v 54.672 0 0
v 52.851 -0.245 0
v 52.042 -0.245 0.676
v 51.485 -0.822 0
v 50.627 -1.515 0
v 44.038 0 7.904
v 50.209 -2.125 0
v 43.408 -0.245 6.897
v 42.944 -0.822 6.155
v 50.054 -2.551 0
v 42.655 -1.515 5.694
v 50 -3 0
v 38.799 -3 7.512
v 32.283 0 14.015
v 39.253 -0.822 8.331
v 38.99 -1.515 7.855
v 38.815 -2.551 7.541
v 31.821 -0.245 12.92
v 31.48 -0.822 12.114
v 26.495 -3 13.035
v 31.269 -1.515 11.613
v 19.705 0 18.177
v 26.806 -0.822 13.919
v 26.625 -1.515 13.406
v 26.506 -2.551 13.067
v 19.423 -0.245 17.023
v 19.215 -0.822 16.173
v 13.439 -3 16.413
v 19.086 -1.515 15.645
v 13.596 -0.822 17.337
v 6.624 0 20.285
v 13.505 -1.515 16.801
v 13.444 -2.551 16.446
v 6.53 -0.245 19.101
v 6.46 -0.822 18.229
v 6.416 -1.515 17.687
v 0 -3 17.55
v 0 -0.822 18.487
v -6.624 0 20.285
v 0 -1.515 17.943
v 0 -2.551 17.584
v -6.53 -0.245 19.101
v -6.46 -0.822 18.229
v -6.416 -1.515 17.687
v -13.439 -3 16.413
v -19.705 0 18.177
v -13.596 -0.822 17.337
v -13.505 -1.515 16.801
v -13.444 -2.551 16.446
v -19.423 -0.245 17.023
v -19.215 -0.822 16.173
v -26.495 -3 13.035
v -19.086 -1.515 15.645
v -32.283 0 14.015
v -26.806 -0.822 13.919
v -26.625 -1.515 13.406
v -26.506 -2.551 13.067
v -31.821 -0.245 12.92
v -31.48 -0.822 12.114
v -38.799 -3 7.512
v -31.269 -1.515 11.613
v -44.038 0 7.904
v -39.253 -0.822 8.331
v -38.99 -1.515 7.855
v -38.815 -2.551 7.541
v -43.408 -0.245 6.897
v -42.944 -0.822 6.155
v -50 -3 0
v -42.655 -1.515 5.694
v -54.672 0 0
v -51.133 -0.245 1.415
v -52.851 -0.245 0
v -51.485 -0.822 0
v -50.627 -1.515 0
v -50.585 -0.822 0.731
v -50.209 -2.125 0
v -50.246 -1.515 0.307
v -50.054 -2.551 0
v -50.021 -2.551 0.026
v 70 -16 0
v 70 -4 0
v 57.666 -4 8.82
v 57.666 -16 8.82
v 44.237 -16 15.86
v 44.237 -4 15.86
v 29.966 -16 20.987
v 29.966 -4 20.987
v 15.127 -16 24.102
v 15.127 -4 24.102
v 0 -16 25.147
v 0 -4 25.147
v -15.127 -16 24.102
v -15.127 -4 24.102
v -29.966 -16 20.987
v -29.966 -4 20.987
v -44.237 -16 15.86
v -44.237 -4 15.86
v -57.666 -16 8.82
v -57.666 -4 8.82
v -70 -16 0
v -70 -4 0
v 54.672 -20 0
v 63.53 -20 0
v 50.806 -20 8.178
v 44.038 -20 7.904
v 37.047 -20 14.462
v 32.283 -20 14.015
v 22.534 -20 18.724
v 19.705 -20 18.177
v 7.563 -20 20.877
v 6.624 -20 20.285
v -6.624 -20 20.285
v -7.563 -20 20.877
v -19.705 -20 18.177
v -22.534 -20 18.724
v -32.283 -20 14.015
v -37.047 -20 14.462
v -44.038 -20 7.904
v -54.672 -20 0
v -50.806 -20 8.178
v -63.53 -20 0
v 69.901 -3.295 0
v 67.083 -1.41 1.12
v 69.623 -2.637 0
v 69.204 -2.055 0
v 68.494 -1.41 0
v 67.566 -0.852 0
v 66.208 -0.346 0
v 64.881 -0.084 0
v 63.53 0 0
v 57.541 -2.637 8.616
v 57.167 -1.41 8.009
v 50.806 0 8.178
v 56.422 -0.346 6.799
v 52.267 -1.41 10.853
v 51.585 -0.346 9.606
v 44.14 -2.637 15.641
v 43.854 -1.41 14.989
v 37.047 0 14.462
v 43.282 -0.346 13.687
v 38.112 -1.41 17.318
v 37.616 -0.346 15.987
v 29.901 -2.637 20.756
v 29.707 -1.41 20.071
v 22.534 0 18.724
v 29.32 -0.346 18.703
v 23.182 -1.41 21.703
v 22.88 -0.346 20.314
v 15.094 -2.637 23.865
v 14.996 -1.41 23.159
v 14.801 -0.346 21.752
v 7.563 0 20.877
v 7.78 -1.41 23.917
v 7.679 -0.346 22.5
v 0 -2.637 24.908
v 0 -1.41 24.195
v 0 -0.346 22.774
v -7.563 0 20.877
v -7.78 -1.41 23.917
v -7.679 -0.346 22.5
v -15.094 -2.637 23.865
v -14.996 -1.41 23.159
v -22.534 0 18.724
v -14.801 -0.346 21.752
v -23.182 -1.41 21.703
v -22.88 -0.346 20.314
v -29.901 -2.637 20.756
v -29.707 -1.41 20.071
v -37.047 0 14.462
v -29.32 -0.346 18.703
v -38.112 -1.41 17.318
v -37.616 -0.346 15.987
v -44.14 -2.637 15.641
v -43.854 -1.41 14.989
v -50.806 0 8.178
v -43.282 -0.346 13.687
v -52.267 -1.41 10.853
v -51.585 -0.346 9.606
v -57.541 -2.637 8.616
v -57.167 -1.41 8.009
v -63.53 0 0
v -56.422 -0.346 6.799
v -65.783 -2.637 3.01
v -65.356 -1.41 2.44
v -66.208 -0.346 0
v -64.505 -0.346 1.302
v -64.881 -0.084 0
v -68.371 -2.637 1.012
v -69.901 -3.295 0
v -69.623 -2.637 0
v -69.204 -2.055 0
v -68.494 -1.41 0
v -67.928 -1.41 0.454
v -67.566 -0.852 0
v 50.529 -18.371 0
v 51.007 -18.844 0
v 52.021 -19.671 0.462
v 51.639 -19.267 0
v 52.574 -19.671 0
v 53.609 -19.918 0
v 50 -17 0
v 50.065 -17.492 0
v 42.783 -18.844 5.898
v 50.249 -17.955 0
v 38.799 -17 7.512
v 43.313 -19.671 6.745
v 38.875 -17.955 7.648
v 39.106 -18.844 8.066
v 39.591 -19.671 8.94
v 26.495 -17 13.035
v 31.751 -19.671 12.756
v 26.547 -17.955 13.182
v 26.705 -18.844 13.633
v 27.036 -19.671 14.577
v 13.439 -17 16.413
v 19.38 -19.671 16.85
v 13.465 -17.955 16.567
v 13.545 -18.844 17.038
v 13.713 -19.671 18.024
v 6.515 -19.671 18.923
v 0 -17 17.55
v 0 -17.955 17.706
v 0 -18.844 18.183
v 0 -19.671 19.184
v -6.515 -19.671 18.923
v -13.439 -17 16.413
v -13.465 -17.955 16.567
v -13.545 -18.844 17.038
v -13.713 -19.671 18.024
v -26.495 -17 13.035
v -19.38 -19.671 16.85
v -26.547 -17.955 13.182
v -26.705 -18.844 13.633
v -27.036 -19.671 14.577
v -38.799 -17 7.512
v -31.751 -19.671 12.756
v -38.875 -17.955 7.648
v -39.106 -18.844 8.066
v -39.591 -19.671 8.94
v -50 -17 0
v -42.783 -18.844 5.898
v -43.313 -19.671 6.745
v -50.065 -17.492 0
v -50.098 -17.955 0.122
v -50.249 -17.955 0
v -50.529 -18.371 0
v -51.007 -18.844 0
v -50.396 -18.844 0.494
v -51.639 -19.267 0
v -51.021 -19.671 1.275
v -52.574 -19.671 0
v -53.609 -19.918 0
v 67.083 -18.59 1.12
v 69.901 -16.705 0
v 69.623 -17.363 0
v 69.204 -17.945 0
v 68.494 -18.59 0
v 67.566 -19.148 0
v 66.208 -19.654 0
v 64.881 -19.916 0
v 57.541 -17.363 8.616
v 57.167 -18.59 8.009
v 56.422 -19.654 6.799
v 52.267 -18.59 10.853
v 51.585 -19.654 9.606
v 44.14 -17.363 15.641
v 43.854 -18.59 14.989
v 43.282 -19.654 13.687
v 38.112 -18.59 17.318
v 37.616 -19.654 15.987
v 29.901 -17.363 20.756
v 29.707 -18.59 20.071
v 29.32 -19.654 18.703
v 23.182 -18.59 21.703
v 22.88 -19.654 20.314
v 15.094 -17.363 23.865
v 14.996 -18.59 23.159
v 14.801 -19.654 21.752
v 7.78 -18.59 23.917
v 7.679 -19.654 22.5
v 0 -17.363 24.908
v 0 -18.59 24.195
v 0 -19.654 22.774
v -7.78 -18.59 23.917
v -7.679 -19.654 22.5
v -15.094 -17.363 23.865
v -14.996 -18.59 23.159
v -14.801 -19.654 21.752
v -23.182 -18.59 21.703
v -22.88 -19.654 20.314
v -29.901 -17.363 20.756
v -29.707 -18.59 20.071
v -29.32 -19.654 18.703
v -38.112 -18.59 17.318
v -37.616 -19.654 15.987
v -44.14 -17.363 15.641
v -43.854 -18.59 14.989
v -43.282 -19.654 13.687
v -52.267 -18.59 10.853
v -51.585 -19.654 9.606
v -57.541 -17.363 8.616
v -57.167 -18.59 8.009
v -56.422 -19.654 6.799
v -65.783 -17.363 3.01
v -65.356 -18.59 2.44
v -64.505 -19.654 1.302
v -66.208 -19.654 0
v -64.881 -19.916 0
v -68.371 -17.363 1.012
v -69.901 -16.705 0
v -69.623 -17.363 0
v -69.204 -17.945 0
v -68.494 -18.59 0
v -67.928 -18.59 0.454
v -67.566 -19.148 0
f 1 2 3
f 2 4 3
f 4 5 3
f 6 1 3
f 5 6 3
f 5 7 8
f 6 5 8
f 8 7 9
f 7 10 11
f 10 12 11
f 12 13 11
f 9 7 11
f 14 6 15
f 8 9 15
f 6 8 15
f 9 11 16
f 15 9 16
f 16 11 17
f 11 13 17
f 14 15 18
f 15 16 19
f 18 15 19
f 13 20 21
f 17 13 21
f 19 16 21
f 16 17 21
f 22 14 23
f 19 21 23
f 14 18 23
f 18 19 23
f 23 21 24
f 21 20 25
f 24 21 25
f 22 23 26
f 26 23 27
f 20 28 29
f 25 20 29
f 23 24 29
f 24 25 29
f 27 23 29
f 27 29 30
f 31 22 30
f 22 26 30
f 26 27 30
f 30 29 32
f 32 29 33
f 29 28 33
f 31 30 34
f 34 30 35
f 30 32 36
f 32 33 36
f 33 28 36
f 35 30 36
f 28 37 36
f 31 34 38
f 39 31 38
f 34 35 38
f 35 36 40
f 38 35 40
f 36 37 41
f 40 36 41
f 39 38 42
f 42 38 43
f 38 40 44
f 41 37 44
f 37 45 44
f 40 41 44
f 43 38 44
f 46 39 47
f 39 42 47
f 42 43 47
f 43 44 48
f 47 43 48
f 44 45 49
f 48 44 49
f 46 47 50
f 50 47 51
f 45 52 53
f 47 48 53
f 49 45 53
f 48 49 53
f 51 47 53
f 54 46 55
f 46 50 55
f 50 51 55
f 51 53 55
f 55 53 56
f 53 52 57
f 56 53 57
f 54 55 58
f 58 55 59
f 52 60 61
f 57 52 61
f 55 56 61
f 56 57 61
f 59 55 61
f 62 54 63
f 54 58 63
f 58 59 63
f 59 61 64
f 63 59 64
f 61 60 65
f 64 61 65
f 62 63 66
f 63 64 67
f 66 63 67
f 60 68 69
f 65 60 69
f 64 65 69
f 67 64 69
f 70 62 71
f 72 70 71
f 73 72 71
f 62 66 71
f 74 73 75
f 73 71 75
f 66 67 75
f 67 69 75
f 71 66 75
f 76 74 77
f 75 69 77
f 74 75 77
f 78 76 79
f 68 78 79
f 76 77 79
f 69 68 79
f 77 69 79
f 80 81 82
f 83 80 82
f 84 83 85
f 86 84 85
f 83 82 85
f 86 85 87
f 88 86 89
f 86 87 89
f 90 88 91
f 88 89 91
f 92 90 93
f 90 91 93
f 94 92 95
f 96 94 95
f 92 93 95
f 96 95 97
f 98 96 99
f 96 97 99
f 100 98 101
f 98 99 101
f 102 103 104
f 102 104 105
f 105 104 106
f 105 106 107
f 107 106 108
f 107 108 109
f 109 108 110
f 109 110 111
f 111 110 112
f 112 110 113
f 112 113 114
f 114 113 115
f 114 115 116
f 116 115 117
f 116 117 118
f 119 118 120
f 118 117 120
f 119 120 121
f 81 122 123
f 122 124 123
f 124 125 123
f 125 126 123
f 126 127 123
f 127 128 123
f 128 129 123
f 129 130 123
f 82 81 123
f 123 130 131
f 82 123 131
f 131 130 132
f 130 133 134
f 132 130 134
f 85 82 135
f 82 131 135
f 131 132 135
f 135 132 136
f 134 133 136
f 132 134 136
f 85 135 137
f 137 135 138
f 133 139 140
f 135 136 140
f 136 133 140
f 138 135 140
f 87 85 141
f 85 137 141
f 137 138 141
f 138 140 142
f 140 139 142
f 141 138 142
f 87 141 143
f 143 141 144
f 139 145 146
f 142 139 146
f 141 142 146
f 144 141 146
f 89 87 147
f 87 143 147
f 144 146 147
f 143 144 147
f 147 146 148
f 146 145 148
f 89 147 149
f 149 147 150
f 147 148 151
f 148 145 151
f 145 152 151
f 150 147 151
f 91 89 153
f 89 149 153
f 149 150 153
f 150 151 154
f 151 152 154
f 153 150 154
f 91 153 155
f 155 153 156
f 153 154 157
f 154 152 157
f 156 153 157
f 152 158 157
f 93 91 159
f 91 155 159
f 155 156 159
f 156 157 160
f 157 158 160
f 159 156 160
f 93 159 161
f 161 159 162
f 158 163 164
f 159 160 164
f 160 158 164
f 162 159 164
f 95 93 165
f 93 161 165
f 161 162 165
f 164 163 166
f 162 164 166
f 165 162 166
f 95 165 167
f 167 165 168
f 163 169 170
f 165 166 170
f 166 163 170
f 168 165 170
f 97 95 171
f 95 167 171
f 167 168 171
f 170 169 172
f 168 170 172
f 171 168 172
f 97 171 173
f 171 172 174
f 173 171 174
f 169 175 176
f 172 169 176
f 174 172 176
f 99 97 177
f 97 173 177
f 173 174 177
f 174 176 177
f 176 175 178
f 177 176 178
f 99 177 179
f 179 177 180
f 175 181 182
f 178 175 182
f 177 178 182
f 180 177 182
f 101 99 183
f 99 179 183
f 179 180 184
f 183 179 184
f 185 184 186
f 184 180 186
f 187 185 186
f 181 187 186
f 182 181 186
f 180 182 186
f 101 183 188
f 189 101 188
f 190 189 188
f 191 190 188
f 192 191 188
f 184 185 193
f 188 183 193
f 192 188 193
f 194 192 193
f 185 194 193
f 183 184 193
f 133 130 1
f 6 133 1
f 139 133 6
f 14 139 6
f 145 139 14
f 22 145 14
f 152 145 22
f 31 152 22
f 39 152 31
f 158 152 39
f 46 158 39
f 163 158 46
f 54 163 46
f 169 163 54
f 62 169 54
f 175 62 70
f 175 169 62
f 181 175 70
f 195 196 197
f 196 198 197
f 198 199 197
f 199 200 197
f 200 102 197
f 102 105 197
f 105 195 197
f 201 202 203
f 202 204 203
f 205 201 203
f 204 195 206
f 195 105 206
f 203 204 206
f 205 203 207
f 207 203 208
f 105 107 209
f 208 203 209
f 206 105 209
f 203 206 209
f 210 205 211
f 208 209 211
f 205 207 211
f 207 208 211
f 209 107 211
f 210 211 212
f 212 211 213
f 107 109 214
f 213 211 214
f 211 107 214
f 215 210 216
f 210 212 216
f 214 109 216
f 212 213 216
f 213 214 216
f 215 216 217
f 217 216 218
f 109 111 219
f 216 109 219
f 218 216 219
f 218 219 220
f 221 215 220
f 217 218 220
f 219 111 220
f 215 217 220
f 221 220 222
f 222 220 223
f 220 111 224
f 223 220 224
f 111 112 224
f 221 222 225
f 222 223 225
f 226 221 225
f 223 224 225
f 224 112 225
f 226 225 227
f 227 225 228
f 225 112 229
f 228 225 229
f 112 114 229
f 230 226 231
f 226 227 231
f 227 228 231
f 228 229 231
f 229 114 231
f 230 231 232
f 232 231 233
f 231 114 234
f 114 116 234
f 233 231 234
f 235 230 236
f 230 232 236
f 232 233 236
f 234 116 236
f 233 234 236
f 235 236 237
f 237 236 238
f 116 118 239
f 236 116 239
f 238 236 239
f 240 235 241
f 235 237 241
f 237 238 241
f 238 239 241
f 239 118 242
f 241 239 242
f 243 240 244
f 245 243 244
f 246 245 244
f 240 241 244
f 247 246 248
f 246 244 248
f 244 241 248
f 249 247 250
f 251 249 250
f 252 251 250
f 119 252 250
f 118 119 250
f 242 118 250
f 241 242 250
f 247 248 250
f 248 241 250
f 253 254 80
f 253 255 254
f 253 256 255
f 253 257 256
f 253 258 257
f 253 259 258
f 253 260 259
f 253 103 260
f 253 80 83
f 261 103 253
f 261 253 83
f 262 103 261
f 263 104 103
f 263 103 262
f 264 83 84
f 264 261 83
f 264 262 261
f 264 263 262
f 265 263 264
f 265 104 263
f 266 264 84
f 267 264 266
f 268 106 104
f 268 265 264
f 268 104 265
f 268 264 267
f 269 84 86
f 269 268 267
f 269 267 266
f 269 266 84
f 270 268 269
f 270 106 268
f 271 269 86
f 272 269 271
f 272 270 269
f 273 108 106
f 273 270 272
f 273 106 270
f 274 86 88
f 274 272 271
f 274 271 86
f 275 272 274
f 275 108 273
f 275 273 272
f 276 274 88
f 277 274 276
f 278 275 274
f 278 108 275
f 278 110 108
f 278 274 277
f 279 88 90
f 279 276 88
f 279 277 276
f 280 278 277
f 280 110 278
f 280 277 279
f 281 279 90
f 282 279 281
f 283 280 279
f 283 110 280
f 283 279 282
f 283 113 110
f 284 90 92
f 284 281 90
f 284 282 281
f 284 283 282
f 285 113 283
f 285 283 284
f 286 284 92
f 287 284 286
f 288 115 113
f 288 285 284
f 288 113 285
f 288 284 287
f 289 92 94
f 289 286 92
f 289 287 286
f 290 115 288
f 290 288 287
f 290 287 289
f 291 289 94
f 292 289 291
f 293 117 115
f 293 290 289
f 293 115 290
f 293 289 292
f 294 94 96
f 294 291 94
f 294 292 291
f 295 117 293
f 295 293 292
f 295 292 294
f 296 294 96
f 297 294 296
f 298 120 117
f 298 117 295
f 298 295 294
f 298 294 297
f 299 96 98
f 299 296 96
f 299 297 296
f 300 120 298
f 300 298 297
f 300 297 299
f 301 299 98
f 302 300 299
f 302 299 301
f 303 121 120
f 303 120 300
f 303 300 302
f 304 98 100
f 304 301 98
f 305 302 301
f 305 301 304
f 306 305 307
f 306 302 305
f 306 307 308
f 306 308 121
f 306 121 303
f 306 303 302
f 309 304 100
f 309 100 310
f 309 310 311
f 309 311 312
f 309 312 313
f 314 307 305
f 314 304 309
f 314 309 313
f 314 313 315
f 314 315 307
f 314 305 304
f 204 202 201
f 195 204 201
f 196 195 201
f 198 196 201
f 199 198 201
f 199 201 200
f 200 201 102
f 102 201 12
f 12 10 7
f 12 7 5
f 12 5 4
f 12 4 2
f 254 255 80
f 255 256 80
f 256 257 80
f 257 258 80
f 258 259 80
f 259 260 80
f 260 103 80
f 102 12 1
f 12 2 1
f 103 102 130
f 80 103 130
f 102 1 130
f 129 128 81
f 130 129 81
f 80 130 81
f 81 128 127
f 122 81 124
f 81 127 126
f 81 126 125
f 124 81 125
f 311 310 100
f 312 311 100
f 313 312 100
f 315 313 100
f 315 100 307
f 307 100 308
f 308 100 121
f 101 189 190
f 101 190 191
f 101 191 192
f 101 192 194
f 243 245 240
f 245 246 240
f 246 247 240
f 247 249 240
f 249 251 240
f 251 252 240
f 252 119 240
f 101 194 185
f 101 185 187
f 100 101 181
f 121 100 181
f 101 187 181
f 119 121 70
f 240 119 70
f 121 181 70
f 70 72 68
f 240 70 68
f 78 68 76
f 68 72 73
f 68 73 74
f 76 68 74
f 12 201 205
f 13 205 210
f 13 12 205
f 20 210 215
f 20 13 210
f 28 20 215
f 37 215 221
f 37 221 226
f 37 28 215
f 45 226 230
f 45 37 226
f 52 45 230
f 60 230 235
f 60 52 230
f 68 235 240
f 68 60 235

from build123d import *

# Parameters (mm, degrees)
PAD_DEPTH   = 20
FILLET_R    = 4
FILLET001_R = 4
FILLET002_R = 3
FILLET003_R = 3


with BuildPart() as part:
    # Sketch → Pad (new body)
    with BuildSketch(Plane.XZ):
        with BuildLine():
            ThreePointArc((50, 0), (0, 17.55002), (-50, 0))
            Line((-70, 0), (-50, 0))
            ThreePointArc((70, 0), (0, 25.147186), (-70, 0))
            Line((50, 0), (70, 0))
        make_face()
    extrude(amount=PAD_DEPTH)

    # Fillet
    fillet_edges = [part.edges().sort_by_distance(p)[0] for p in [
        (0, -20, 25.147186),
    ]]
    fillet(fillet_edges, radius=FILLET_R)

    # Fillet001
    fillet001_edges = [part.edges().sort_by_distance(p)[0] for p in [
        (0, 0, 25.147186),
    ]]
    fillet(fillet001_edges, radius=FILLET001_R)

    # Fillet002
    fillet002_edges = [part.edges().sort_by_distance(p)[0] for p in [
        (0, 0, 17.55002),
    ]]
    fillet(fillet002_edges, radius=FILLET002_R)

    # Fillet003
    fillet003_edges = [part.edges().sort_by_distance(p)[0] for p in [
        (0, -20, 17.55002),
    ]]
    fillet(fillet003_edges, radius=FILLET003_R)


solid = part.part
